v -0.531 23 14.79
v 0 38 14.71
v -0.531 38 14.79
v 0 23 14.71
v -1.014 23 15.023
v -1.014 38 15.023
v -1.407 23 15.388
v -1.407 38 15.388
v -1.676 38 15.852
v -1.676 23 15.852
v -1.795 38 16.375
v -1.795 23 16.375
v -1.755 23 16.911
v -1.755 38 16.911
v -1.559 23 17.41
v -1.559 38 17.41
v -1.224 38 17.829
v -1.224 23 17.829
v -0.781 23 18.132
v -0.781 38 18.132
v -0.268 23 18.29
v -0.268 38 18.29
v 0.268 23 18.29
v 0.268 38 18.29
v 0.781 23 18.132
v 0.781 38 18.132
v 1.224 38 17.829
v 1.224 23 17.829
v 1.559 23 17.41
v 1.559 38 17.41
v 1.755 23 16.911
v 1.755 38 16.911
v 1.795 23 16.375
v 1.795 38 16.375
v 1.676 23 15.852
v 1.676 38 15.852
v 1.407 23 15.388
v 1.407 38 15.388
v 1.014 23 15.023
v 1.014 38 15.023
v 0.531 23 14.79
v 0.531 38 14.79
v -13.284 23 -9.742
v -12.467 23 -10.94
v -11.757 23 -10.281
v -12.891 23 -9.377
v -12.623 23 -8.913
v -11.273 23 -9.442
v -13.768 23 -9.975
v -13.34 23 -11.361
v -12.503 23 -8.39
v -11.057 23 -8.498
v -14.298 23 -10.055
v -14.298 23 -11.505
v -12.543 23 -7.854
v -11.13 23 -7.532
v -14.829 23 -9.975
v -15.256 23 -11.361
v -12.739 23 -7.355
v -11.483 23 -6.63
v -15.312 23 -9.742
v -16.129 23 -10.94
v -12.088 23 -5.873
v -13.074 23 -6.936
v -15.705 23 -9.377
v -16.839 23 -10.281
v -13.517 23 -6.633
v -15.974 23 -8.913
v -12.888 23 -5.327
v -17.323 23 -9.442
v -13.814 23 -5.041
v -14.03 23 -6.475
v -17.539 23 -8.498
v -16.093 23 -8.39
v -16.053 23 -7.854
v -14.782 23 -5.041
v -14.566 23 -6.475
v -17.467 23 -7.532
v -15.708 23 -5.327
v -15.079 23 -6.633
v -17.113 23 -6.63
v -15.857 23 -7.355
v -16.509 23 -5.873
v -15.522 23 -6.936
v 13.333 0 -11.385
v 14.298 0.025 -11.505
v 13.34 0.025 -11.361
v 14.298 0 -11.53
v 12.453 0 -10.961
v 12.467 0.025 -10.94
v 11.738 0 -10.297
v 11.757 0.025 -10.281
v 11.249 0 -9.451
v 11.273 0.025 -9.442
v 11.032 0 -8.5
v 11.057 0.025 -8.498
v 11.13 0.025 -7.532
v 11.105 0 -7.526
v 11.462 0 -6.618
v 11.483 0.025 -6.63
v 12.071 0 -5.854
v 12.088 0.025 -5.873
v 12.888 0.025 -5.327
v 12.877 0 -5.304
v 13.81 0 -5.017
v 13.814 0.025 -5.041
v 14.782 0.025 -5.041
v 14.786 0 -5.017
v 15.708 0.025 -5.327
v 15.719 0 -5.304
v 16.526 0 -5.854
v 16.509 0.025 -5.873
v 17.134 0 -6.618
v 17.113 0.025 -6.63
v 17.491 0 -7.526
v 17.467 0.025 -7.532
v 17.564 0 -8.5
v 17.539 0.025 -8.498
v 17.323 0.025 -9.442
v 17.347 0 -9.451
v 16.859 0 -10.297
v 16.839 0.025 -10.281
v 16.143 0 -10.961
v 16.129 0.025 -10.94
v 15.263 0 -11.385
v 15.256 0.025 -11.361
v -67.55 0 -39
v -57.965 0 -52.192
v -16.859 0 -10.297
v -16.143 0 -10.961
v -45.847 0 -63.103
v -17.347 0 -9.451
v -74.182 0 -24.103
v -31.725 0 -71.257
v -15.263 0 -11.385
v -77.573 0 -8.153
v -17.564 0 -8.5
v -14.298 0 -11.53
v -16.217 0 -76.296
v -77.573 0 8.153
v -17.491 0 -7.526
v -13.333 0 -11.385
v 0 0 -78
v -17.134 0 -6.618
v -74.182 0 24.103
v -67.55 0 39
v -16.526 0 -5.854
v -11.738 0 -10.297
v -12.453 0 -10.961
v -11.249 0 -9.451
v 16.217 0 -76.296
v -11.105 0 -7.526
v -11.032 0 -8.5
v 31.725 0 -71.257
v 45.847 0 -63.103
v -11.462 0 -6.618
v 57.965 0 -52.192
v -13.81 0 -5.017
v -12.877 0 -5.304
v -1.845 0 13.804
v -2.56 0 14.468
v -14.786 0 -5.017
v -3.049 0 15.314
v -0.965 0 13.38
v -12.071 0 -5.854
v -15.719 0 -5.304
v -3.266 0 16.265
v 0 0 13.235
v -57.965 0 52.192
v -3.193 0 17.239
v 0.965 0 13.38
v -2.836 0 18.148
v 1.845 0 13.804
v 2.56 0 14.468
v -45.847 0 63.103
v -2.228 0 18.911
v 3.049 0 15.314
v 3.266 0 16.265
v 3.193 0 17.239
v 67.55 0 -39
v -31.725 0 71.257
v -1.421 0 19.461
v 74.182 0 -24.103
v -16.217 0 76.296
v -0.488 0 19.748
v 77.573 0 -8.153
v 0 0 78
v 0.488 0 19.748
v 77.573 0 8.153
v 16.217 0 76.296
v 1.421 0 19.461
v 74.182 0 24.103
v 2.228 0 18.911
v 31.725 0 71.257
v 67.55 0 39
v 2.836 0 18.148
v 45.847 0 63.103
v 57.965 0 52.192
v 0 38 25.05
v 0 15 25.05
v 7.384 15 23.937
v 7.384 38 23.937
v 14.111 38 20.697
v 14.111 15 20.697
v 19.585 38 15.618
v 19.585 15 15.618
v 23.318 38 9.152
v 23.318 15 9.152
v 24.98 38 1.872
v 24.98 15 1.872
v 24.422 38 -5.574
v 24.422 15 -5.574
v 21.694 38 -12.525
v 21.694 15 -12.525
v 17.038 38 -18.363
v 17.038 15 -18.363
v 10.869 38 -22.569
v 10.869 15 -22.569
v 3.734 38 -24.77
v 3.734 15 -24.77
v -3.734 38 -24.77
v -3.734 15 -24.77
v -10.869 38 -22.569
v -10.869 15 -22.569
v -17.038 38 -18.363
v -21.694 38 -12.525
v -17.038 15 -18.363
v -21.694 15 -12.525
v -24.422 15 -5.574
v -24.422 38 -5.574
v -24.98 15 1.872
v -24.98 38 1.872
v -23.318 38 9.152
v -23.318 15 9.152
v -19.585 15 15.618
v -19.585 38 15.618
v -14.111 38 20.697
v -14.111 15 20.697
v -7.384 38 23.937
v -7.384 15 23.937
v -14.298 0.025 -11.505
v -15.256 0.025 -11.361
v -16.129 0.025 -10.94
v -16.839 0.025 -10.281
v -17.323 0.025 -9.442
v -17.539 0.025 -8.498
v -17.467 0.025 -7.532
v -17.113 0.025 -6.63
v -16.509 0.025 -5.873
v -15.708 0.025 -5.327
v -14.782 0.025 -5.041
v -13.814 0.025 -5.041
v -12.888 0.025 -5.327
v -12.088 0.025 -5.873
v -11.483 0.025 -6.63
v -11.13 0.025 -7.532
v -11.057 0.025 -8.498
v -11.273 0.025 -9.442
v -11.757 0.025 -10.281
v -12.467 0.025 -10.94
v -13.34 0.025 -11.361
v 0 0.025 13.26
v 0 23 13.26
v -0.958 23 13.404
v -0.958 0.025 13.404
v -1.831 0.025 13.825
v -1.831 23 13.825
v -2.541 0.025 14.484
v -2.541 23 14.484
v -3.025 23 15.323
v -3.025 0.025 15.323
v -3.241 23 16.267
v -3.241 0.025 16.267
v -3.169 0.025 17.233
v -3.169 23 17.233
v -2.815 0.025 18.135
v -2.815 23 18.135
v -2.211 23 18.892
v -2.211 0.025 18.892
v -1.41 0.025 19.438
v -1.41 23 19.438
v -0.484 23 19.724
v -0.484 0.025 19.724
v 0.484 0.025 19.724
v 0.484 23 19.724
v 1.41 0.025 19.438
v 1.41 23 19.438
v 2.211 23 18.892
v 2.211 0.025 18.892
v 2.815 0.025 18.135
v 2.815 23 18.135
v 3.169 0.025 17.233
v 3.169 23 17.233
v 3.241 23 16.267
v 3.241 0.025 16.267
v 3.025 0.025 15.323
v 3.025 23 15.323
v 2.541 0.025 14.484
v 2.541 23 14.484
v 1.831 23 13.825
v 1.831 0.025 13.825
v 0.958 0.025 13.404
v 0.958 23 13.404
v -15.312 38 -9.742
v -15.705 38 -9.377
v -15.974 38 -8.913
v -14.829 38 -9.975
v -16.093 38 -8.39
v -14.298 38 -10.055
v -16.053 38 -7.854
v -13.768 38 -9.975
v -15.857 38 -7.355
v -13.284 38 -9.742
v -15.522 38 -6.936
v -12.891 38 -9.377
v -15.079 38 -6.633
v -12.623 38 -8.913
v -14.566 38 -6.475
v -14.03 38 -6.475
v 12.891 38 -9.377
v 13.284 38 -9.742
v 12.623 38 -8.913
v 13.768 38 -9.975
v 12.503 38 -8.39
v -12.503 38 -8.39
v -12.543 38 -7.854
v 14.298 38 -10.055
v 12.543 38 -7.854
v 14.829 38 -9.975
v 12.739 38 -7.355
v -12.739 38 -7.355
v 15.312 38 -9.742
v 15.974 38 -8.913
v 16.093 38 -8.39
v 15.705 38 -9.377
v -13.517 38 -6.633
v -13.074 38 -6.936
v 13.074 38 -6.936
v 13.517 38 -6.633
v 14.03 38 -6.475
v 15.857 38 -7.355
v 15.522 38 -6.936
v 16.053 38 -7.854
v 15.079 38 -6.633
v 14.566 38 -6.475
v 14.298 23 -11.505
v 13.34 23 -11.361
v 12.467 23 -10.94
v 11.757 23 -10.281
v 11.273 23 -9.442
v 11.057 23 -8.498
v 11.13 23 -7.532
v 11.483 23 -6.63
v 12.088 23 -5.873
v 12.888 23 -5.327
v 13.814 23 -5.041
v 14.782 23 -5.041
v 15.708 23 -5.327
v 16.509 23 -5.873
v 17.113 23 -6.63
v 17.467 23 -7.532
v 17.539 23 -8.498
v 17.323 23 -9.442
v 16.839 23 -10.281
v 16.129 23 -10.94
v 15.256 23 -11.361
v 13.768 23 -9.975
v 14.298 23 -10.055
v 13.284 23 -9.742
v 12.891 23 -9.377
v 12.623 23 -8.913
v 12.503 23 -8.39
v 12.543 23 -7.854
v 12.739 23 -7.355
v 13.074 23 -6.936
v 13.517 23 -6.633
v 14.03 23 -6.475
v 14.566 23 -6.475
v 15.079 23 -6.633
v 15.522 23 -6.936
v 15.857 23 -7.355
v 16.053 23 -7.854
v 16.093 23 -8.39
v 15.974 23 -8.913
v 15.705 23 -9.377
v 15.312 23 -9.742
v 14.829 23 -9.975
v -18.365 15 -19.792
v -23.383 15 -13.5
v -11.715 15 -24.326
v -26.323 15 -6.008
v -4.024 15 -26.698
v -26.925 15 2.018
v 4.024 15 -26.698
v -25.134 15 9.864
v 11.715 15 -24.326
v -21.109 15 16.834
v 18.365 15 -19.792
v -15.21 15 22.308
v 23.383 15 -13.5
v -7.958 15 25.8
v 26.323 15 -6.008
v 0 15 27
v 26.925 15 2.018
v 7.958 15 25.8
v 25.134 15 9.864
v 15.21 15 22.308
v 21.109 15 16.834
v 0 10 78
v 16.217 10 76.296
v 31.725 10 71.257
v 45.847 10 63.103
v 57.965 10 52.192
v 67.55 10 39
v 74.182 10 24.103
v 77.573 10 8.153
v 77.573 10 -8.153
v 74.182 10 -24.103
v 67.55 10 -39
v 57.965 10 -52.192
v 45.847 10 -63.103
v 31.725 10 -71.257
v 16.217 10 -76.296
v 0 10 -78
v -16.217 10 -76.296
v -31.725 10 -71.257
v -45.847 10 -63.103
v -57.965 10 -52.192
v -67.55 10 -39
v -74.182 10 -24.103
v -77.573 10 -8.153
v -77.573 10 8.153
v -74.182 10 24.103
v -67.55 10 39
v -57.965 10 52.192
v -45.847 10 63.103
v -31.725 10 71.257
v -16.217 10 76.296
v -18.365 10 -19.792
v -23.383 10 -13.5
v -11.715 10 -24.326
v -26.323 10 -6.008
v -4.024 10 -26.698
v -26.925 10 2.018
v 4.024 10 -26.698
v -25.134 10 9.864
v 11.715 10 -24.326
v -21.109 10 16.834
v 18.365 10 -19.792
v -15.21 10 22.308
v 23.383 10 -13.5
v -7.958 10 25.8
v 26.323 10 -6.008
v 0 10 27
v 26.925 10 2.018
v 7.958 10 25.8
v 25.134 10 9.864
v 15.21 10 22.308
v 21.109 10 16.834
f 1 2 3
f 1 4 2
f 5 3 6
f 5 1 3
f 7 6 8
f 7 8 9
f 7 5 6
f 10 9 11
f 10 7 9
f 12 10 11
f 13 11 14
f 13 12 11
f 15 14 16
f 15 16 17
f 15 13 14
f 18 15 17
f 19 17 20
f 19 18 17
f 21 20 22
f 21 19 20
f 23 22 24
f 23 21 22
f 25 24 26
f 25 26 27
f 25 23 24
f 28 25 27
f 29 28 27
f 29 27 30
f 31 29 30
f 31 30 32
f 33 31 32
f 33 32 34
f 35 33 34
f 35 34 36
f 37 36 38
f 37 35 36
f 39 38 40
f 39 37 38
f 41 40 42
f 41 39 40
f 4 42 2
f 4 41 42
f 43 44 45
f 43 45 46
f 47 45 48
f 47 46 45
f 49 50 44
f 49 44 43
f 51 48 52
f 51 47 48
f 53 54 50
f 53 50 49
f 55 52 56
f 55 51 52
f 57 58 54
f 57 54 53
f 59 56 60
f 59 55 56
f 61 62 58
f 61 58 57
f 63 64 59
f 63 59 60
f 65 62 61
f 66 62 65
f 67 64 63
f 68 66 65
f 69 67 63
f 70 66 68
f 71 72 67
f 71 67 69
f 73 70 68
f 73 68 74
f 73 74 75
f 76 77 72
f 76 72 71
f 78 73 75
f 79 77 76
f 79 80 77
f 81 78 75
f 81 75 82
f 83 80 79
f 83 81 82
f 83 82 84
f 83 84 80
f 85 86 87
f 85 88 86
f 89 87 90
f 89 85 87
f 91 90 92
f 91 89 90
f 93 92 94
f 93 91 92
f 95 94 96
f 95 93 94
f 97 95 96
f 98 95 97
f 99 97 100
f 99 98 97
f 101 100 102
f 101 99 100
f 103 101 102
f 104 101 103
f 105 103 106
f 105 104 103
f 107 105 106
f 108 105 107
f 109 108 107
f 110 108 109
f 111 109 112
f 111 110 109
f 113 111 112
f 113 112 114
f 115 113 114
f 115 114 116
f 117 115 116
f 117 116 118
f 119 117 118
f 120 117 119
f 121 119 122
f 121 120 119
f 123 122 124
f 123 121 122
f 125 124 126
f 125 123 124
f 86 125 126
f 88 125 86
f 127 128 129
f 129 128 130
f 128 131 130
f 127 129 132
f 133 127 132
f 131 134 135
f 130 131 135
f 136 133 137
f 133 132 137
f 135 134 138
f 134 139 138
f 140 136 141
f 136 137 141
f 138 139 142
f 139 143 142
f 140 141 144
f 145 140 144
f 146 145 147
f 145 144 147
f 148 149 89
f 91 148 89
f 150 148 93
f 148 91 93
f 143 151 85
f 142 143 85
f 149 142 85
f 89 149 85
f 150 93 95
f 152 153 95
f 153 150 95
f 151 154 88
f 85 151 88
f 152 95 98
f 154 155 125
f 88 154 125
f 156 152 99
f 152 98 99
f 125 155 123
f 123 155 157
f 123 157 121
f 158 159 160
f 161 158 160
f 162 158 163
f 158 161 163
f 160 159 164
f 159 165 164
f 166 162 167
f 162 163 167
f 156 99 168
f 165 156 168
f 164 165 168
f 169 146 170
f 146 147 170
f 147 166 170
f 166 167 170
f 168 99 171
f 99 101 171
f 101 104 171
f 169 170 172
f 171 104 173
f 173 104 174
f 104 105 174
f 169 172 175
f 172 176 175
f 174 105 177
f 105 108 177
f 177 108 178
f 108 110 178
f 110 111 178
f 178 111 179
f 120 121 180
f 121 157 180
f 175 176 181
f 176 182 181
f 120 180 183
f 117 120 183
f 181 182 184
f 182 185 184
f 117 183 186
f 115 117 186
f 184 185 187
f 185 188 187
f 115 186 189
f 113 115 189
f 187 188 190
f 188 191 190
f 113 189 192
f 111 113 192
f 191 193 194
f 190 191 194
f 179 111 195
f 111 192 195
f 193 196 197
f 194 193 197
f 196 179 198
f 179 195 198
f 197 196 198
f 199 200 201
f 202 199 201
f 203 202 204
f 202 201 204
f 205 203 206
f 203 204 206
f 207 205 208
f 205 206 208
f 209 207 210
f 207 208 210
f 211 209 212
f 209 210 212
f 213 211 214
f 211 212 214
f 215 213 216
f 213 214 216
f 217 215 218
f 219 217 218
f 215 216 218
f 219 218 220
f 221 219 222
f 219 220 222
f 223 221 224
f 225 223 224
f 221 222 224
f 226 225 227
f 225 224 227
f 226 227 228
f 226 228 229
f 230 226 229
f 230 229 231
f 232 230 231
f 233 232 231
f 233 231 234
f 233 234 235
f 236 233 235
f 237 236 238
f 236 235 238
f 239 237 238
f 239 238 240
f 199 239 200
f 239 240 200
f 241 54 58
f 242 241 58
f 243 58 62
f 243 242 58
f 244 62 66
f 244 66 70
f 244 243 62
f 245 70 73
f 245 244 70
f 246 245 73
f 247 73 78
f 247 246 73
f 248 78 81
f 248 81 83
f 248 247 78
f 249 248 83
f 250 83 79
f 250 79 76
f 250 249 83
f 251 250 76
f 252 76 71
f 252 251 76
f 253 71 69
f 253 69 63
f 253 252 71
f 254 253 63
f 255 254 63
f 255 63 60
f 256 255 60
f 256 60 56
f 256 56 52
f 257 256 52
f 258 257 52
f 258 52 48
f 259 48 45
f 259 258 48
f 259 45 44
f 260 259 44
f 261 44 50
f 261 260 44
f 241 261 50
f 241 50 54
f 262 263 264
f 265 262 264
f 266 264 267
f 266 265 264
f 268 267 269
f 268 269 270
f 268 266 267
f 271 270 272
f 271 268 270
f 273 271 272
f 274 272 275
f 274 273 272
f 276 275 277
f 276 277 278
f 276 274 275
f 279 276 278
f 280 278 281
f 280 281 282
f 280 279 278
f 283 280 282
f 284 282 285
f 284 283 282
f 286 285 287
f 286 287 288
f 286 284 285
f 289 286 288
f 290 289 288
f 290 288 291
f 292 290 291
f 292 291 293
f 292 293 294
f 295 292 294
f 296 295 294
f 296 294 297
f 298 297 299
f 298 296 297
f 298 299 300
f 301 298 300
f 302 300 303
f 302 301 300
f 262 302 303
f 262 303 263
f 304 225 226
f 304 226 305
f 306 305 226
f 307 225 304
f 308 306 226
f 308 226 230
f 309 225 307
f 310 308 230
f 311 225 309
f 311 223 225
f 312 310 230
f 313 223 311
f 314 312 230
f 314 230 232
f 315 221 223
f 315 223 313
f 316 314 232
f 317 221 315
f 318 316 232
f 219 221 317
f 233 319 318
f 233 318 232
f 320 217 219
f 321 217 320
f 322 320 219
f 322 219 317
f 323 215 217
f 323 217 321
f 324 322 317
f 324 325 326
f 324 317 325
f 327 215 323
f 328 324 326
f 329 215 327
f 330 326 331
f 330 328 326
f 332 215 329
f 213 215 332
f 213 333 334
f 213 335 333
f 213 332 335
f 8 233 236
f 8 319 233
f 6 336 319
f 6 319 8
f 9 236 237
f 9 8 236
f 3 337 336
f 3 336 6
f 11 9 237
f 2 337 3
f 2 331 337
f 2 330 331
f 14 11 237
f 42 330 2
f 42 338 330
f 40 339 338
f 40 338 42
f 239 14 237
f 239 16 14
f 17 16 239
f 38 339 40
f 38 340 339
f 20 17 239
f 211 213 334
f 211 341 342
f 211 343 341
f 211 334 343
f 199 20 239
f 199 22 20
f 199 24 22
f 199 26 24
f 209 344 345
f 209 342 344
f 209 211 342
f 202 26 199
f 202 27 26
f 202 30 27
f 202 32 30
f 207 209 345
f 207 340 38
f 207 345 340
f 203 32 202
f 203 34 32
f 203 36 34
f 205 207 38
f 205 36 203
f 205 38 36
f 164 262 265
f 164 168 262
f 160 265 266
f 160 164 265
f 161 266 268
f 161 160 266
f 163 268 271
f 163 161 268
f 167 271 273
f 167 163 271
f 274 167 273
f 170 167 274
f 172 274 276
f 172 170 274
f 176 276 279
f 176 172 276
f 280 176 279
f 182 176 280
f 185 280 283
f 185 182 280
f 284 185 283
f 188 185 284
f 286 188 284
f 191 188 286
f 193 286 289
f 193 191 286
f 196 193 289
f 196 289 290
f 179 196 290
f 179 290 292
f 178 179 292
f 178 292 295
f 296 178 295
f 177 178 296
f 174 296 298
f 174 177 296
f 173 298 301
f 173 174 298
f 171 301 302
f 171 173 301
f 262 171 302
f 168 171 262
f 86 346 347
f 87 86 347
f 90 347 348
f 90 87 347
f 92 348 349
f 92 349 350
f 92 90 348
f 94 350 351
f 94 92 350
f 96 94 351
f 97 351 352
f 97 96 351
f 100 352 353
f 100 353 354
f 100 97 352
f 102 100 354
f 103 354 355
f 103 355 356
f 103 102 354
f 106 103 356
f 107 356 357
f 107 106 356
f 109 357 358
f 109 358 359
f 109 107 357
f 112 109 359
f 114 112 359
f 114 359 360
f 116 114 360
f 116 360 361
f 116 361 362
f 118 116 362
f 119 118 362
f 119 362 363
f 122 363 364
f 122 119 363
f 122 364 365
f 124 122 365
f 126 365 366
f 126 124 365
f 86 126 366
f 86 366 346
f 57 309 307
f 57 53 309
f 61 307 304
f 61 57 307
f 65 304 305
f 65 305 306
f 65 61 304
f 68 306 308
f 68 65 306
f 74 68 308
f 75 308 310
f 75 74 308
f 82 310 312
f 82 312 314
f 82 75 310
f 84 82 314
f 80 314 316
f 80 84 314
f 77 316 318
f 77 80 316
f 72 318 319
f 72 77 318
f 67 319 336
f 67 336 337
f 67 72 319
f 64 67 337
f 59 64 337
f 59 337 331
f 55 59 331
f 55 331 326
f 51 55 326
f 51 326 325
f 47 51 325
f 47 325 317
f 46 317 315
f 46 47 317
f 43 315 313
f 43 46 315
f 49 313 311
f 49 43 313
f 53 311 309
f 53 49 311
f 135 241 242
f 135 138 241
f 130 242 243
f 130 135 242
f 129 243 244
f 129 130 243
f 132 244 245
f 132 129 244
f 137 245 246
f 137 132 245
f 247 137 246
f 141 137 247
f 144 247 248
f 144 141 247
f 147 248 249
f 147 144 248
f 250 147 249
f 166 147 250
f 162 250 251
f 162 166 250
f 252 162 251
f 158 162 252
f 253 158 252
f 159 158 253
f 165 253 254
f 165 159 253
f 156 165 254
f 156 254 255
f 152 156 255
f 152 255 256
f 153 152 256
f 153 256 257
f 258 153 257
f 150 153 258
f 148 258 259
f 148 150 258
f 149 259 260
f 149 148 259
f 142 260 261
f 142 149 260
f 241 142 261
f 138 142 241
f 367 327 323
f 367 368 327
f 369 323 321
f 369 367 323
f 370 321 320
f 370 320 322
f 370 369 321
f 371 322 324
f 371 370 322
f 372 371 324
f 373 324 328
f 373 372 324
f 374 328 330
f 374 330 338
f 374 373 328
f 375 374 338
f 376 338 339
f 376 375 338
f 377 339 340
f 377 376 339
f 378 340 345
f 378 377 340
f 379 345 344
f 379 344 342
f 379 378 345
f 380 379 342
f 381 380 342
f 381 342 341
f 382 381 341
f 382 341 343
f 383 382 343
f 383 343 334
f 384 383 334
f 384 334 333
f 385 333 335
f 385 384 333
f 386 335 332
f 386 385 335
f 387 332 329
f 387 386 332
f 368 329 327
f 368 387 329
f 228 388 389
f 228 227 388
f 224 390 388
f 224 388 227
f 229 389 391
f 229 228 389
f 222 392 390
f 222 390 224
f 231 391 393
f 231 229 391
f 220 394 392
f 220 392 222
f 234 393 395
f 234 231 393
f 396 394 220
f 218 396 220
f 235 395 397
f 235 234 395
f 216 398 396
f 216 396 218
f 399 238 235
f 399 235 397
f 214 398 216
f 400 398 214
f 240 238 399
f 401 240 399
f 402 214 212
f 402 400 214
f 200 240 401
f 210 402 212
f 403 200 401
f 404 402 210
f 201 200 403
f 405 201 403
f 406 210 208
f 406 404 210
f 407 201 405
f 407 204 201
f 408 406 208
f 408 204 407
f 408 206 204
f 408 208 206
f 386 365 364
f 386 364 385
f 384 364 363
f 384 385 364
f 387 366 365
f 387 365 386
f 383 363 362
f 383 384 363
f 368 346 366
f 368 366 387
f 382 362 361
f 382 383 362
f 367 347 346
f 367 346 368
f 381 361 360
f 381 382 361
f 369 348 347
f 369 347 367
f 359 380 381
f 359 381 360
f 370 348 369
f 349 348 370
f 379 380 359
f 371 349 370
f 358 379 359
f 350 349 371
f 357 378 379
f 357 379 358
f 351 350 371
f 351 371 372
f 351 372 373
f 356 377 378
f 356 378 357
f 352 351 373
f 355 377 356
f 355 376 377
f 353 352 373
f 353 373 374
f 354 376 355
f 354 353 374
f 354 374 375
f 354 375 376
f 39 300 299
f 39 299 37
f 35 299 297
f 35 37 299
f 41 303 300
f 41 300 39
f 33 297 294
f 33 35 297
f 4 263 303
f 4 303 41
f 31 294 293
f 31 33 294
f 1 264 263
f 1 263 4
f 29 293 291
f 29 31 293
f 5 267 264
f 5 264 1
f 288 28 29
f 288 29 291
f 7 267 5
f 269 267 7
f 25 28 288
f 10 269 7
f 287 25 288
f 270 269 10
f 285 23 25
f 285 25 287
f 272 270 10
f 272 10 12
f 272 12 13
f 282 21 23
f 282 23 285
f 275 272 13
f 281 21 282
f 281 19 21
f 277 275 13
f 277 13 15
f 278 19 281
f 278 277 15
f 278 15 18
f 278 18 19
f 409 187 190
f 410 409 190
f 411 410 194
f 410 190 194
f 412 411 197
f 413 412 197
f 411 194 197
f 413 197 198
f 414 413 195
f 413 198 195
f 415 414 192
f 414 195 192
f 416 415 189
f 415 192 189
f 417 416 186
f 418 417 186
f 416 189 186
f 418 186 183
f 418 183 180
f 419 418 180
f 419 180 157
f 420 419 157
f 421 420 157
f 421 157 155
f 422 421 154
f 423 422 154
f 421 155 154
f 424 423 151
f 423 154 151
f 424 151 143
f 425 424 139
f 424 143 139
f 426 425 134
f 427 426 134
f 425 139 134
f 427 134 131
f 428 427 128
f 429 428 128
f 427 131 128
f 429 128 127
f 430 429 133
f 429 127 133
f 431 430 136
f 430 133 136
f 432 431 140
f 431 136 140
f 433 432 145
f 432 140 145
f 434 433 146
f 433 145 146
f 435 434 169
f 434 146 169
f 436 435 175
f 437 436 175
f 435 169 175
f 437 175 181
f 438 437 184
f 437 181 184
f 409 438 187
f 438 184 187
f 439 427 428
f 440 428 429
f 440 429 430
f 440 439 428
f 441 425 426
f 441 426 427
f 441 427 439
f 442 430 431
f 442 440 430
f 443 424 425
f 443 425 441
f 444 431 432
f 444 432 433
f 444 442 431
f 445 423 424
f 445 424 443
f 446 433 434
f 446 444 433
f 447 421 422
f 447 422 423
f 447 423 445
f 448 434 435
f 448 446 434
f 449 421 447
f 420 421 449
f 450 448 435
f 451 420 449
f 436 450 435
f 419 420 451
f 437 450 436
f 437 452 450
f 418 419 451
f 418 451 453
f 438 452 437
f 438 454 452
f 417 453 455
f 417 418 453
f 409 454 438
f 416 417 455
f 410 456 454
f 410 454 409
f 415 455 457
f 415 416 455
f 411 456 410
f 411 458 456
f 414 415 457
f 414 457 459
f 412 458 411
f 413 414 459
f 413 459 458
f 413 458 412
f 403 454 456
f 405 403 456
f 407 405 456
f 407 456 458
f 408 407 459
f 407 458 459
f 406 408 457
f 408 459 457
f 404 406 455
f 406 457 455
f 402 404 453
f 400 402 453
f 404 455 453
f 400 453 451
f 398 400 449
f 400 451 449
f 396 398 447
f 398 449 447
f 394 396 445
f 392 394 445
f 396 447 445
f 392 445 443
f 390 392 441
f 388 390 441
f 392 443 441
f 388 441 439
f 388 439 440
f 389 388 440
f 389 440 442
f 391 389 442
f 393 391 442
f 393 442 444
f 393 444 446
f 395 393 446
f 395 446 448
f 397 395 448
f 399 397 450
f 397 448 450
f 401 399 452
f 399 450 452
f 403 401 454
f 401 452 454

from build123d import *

# Parameters (mm, degrees)
SKETCH1_R                     = 78
BOSS_EXTRUDE1_DEPTH           = 10
SKETCH2_R                     = 27
BOSS_EXTRUDE2_DEPTH           = 5
SKETCH3_R                     = 25.05
BOSS_EXTRUDE3_DEPTH           = 23
CBORE_FOR_M3_SHCS1_AT_2_COUNT = 2
CBORE_FOR_M3_SHCS1_AT_2_PITCH = 28.596158833
CBORE_FOR_M3_SHCS1_AT_3_COUNT = 2
CBORE_FOR_M3_SHCS1_AT_3_PITCH = 28.596158833


with BuildPart() as part:
    # Sketch1 → Boss-Extrude1 (new body)
    with BuildSketch(Plane(origin=(0, 0, 0), x_dir=(1, 0, 0), z_dir=(0, 1, 0))):
        with Locations(Location((0, 0, 0), (0, 0, 270))):
            Circle(SKETCH1_R)
    extrude(amount=BOSS_EXTRUDE1_DEPTH)

    # Sketch2 → Boss-Extrude2 (add)
    with BuildSketch(Plane(origin=(0, 10, 0), x_dir=(1, 0, 0), z_dir=(0, 1, 0))):
        with Locations(Location((0, 0, 0), (0, 0, 270))):
            Circle(SKETCH2_R)
    extrude(amount=BOSS_EXTRUDE2_DEPTH)

    # Sketch3 → Boss-Extrude3 (add)
    with BuildSketch(Plane(origin=(0, 15, 0), x_dir=(1, 0, 0), z_dir=(0, 1, 0))):
        with Locations(Location((0, 0, 0), (0, 0, 270))):
            Circle(SKETCH3_R)
    extrude(amount=BOSS_EXTRUDE3_DEPTH)

    # Sketch5 → CBORE for M3 SHCS1 (revolve, cut)
    with BuildSketch(Plane(origin=(0, 0, 16.51), x_dir=(0, 0, -1), z_dir=(1, 0, 0))):
        Polygon((0, 0), (0, 38), (1.8, 38), (1.8, 23), (3.25, 23), (3.25, 0.025), (3.275, 0), align=None)
    cbore_for_m3_shcs1 = revolve(axis=Axis((0, -6.35, 16.51), (0, 1, 0)), mode=Mode.SUBTRACT)

    # CBORE for M3 SHCS1 at 2: CBORE for M3 SHCS1 ×2
    with Locations(*[Vector(0.5000000000000012, 0, -0.8660254037844379) * (i * CBORE_FOR_M3_SHCS1_AT_2_PITCH) for i in range(1, CBORE_FOR_M3_SHCS1_AT_2_COUNT)]):
        add(cbore_for_m3_shcs1, mode=Mode.SUBTRACT)

    # CBORE for M3 SHCS1 at 3: CBORE for M3 SHCS1 ×2
    with Locations(*[Vector(-0.4999999999999978, 0, -0.8660254037844399) * (i * CBORE_FOR_M3_SHCS1_AT_3_PITCH) for i in range(1, CBORE_FOR_M3_SHCS1_AT_3_COUNT)]):
        add(cbore_for_m3_shcs1, mode=Mode.SUBTRACT)


solid = part.part
